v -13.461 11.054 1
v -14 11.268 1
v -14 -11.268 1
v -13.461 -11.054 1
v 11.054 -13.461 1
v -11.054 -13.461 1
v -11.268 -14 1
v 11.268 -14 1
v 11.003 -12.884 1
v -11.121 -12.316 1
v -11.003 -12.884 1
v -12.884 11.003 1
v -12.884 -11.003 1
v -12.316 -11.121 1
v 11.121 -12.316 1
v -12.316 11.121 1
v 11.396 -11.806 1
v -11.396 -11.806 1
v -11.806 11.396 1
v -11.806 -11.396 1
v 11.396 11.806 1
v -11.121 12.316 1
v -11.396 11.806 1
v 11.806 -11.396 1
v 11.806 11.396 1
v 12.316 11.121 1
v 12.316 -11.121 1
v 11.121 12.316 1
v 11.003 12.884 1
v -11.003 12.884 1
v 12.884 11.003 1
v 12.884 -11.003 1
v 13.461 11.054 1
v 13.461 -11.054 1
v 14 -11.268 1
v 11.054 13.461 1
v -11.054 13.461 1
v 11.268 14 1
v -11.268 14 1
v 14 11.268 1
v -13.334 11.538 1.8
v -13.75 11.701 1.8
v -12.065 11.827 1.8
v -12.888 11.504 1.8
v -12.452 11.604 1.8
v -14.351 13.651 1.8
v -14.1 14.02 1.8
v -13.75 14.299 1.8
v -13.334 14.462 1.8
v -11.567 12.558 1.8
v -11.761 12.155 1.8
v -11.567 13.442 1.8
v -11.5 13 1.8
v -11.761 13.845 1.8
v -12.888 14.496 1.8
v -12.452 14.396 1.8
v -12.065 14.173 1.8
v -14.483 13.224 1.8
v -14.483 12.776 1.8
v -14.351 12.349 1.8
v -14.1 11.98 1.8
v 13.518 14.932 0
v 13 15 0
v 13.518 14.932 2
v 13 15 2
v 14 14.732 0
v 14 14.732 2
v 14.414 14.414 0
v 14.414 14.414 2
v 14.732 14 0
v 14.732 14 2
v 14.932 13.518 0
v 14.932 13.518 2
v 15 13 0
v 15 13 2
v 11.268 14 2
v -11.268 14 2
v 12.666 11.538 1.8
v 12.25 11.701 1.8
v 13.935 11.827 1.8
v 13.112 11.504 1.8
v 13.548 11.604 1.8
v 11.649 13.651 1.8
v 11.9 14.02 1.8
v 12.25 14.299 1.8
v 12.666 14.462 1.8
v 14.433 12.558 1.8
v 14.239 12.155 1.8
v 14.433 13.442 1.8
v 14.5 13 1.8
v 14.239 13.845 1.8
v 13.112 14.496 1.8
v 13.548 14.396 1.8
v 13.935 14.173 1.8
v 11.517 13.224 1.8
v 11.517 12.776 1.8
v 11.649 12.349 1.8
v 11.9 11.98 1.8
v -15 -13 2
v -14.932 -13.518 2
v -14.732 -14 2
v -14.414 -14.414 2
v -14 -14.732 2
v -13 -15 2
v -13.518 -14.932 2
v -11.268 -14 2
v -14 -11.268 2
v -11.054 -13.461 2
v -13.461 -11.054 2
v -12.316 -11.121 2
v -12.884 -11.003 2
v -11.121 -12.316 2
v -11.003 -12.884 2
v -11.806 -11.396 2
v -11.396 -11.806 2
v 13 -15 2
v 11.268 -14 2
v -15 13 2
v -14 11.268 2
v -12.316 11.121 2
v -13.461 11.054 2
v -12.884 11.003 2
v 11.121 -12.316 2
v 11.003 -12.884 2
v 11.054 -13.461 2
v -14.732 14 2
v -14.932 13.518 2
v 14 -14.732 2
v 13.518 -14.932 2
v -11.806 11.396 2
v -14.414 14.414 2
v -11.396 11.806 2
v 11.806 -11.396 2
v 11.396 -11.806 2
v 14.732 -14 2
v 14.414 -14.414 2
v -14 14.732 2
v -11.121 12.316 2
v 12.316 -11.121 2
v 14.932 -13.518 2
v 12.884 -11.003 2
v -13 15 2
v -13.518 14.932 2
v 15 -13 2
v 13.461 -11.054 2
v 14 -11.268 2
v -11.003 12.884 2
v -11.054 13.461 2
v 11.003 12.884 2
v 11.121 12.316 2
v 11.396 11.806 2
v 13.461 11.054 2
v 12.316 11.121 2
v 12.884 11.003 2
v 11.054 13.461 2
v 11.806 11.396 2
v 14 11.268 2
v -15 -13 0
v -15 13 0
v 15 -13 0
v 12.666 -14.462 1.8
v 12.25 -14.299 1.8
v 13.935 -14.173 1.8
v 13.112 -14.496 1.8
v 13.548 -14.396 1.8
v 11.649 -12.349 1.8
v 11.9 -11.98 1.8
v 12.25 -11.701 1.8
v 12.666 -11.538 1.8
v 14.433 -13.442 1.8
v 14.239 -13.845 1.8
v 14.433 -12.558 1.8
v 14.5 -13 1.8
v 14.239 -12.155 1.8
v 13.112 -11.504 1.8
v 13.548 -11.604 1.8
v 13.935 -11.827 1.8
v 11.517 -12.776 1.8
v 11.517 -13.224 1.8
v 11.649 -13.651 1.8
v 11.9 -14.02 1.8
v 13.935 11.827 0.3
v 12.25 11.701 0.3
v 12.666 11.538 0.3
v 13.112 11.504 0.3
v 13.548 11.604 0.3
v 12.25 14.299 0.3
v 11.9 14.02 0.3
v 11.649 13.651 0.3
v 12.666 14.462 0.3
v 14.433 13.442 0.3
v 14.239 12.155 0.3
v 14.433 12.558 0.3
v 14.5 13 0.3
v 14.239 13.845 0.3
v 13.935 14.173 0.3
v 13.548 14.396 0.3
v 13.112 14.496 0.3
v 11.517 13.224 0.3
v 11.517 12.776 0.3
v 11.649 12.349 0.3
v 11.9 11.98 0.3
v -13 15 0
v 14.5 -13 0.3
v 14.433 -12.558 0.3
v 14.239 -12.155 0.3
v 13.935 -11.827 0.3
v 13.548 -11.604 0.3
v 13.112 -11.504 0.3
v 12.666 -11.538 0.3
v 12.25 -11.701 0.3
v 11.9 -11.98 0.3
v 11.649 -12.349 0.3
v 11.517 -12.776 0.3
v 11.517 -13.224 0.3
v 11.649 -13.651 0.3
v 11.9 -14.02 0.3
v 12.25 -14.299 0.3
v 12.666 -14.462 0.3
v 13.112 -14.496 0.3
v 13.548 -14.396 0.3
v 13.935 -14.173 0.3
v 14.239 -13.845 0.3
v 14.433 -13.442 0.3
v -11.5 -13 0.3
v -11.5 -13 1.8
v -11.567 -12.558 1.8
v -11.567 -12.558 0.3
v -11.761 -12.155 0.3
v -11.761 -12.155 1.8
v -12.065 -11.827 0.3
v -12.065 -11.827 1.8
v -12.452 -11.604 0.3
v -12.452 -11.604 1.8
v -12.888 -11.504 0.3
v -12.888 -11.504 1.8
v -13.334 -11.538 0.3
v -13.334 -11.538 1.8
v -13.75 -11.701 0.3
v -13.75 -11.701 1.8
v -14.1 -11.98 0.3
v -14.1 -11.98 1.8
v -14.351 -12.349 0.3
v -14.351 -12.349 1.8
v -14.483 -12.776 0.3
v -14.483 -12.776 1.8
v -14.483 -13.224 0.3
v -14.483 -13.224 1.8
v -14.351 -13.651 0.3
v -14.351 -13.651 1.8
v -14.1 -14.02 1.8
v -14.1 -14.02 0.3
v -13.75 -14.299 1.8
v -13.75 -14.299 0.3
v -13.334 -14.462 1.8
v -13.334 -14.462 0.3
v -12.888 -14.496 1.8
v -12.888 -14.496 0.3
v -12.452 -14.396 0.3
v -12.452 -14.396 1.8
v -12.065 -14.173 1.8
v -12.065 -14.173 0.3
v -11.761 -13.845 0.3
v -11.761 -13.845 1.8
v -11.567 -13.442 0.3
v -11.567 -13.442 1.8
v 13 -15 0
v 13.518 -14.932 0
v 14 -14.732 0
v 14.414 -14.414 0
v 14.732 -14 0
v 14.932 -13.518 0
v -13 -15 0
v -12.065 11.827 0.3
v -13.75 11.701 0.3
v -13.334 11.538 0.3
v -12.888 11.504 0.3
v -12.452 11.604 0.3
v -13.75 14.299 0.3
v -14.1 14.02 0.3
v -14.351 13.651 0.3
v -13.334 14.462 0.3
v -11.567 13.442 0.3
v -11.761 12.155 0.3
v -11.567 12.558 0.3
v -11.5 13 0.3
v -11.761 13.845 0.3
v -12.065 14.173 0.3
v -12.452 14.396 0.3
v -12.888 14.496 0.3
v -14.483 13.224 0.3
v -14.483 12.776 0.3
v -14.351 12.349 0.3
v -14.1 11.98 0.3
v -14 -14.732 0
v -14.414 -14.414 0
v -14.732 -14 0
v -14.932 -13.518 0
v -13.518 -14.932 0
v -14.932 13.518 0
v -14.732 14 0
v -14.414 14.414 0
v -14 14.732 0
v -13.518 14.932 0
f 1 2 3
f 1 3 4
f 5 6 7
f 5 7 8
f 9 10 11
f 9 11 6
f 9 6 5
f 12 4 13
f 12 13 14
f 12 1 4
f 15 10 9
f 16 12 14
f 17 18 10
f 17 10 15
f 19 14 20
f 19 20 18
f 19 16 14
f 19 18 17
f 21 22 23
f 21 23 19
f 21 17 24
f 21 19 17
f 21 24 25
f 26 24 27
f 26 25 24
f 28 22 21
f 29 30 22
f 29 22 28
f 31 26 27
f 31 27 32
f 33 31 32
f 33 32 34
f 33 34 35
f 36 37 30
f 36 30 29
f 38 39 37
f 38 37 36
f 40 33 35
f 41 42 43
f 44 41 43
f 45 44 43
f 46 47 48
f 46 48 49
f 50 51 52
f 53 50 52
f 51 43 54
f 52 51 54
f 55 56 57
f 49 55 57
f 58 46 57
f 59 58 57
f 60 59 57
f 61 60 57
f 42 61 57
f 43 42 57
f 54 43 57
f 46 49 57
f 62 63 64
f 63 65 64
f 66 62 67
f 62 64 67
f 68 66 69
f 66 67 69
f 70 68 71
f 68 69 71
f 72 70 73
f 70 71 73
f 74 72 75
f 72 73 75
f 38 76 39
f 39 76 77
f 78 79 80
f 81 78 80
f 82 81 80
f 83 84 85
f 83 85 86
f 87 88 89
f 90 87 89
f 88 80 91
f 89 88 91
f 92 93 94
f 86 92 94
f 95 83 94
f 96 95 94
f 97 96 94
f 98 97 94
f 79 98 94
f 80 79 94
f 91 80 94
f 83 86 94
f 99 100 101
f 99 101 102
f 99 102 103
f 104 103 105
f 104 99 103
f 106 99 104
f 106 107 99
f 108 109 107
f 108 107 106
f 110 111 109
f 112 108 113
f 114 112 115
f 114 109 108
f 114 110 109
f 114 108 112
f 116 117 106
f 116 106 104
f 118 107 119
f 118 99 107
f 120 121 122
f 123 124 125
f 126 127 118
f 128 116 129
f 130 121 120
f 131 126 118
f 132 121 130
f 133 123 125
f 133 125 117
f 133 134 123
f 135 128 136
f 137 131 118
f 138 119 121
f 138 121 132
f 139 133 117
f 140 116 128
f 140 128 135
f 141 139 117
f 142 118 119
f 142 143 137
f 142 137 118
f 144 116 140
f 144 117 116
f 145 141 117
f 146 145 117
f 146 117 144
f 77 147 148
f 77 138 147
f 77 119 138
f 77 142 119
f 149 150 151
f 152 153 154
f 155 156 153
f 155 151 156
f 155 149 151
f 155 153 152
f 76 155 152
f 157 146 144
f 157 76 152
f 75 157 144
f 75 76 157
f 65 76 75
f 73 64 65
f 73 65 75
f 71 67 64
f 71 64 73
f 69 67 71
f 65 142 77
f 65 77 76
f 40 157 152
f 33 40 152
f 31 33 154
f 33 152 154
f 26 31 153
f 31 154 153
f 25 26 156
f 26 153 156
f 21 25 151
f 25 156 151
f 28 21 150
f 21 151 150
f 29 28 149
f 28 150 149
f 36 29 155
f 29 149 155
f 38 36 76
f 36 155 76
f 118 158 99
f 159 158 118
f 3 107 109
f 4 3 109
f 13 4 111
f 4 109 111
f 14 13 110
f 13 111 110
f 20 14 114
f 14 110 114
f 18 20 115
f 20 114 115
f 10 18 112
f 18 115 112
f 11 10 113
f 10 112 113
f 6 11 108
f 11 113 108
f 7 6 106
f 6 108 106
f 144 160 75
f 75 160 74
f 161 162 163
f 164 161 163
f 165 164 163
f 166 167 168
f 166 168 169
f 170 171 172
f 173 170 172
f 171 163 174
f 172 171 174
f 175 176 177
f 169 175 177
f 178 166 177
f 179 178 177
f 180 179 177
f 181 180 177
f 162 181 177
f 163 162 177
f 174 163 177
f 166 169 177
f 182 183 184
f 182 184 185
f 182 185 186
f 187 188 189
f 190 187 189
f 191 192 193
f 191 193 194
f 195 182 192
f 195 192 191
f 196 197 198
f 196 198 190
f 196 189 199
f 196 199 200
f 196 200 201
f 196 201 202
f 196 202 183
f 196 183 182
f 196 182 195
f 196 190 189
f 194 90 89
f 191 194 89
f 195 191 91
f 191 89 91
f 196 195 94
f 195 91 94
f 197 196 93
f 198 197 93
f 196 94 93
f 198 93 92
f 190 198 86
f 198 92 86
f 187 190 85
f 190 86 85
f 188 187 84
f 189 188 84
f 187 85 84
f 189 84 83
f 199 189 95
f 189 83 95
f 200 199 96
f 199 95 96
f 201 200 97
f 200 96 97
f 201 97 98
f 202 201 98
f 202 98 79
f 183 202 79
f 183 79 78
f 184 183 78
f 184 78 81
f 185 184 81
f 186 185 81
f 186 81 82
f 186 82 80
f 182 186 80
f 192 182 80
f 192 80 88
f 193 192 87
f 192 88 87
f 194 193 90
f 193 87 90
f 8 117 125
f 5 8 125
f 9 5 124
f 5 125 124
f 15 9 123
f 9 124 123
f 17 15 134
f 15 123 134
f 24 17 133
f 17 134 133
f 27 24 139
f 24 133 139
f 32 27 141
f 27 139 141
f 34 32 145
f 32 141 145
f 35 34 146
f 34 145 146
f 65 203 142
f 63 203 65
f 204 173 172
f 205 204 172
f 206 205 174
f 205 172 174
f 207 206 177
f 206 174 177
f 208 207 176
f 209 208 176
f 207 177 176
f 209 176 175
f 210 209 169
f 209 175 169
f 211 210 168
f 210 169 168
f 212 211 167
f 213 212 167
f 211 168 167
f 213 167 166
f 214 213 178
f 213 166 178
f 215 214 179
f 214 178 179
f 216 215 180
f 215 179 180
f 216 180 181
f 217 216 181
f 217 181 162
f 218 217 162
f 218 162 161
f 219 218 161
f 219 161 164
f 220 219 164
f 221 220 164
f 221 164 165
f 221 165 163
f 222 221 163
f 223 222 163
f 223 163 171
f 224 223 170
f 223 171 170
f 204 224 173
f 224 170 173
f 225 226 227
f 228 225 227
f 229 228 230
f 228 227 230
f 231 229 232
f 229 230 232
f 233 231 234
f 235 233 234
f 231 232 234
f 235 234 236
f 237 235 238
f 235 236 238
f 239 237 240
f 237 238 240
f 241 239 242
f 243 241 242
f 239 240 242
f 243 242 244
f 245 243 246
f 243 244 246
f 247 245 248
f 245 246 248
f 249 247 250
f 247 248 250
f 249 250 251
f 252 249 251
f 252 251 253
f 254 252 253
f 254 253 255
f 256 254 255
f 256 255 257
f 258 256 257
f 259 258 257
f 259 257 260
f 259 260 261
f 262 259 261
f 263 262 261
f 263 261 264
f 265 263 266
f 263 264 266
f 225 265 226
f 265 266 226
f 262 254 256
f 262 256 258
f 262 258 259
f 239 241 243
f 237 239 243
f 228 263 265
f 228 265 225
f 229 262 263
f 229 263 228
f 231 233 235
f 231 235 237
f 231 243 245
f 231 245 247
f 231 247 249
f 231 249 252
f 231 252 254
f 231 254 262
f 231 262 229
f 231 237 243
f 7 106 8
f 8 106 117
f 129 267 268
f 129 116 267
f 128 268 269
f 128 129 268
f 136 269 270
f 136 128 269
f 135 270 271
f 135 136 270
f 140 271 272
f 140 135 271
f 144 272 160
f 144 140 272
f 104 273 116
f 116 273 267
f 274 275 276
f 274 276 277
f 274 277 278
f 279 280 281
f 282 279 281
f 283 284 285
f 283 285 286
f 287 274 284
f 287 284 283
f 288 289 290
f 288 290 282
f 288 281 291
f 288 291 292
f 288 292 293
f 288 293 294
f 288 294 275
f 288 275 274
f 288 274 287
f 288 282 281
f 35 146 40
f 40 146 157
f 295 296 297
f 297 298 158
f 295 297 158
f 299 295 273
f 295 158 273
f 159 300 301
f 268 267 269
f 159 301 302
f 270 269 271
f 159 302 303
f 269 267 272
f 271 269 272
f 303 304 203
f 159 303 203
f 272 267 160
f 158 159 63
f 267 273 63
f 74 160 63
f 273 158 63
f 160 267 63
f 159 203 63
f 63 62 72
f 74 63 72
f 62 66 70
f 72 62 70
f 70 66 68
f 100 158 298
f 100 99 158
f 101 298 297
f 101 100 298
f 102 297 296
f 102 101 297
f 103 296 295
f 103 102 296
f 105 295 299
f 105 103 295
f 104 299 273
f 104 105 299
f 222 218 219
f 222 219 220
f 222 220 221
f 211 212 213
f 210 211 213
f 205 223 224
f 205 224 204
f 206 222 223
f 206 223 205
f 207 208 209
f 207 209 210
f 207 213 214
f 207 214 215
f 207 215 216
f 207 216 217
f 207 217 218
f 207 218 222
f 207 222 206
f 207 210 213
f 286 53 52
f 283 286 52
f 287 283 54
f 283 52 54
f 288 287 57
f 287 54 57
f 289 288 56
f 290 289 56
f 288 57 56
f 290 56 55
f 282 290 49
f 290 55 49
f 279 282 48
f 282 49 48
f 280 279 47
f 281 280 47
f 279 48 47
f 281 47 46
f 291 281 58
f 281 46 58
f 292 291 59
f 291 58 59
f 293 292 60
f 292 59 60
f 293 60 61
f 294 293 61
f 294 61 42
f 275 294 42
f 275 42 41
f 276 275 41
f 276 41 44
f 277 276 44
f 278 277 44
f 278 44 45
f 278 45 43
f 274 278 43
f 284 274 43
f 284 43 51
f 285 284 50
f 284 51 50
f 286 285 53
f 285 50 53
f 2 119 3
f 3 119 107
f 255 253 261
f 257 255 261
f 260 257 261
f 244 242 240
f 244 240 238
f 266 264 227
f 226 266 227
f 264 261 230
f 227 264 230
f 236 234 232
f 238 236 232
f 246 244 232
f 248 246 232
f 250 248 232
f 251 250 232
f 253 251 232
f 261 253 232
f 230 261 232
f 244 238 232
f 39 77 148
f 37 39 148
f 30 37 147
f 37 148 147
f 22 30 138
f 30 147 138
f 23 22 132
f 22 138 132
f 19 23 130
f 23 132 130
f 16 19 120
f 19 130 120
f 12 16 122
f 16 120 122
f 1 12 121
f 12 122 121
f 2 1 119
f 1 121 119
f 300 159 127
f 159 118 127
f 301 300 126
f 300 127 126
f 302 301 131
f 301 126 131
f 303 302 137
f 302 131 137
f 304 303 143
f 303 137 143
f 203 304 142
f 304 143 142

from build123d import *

# Parameters (mm, degrees)
F0_W     = 30
F0_H     = 30
F1_DEPTH = 2
F3_DEPTH = 1
F5_R     = 1.5
F6_DEPTH = 1.5
F7_R     = 2


with BuildPart() as f1:
    # F0 (on Top) → F1 (new body)
    with BuildSketch(Plane.XY):
        Rectangle(F0_W, F0_H)
    extrude(amount=F1_DEPTH)

    # F2 (on face) → F3 (cut)
    with BuildSketch(Plane.XY.offset(2)):
        with BuildLine():
            ThreePointArc((-11.267949, 14), (-11.585786, 11.585786), (-14, 11.267949))
            Line((-14, 11.267949), (-14, -11.267949))
            ThreePointArc((-14, -11.267949), (-11.585786, -11.585786), (-11.267949, -14))
            Line((-11.267949, -14), (11.267949, -14))
            ThreePointArc((11.267949, -14), (11.585786, -11.585786), (14, -11.267949))
            Line((14, -11.267949), (14, 11.267949))
            ThreePointArc((14, 11.267949), (11.585786, 11.585786), (11.267949, 14))
            Line((11.267949, 14), (-11.267949, 14))
        make_face()
    extrude(amount=-F3_DEPTH, mode=Mode.SUBTRACT)

    # F5 (on offset) → F6 (cut)
    with BuildSketch(Plane.XY.offset(1.8)):
        with Locations((-13, 13)):
            Circle(F5_R)
        with Locations((13, 13)):
            Circle(F5_R)
        with Locations((-13, -13)):
            Circle(F5_R)
        with Locations((13, -13)):
            Circle(F5_R)
    extrude(amount=-F6_DEPTH, mode=Mode.SUBTRACT)

    # F7
    f7_edges = [f1.edges().sort_by_distance(p)[0] for p in [
        (-15, 15, 1),
        (-15, -15, 1),
        (15, -15, 1),
        (15, 15, 1),
    ]]
    fillet(f7_edges, radius=F7_R)


solid = f1.part
